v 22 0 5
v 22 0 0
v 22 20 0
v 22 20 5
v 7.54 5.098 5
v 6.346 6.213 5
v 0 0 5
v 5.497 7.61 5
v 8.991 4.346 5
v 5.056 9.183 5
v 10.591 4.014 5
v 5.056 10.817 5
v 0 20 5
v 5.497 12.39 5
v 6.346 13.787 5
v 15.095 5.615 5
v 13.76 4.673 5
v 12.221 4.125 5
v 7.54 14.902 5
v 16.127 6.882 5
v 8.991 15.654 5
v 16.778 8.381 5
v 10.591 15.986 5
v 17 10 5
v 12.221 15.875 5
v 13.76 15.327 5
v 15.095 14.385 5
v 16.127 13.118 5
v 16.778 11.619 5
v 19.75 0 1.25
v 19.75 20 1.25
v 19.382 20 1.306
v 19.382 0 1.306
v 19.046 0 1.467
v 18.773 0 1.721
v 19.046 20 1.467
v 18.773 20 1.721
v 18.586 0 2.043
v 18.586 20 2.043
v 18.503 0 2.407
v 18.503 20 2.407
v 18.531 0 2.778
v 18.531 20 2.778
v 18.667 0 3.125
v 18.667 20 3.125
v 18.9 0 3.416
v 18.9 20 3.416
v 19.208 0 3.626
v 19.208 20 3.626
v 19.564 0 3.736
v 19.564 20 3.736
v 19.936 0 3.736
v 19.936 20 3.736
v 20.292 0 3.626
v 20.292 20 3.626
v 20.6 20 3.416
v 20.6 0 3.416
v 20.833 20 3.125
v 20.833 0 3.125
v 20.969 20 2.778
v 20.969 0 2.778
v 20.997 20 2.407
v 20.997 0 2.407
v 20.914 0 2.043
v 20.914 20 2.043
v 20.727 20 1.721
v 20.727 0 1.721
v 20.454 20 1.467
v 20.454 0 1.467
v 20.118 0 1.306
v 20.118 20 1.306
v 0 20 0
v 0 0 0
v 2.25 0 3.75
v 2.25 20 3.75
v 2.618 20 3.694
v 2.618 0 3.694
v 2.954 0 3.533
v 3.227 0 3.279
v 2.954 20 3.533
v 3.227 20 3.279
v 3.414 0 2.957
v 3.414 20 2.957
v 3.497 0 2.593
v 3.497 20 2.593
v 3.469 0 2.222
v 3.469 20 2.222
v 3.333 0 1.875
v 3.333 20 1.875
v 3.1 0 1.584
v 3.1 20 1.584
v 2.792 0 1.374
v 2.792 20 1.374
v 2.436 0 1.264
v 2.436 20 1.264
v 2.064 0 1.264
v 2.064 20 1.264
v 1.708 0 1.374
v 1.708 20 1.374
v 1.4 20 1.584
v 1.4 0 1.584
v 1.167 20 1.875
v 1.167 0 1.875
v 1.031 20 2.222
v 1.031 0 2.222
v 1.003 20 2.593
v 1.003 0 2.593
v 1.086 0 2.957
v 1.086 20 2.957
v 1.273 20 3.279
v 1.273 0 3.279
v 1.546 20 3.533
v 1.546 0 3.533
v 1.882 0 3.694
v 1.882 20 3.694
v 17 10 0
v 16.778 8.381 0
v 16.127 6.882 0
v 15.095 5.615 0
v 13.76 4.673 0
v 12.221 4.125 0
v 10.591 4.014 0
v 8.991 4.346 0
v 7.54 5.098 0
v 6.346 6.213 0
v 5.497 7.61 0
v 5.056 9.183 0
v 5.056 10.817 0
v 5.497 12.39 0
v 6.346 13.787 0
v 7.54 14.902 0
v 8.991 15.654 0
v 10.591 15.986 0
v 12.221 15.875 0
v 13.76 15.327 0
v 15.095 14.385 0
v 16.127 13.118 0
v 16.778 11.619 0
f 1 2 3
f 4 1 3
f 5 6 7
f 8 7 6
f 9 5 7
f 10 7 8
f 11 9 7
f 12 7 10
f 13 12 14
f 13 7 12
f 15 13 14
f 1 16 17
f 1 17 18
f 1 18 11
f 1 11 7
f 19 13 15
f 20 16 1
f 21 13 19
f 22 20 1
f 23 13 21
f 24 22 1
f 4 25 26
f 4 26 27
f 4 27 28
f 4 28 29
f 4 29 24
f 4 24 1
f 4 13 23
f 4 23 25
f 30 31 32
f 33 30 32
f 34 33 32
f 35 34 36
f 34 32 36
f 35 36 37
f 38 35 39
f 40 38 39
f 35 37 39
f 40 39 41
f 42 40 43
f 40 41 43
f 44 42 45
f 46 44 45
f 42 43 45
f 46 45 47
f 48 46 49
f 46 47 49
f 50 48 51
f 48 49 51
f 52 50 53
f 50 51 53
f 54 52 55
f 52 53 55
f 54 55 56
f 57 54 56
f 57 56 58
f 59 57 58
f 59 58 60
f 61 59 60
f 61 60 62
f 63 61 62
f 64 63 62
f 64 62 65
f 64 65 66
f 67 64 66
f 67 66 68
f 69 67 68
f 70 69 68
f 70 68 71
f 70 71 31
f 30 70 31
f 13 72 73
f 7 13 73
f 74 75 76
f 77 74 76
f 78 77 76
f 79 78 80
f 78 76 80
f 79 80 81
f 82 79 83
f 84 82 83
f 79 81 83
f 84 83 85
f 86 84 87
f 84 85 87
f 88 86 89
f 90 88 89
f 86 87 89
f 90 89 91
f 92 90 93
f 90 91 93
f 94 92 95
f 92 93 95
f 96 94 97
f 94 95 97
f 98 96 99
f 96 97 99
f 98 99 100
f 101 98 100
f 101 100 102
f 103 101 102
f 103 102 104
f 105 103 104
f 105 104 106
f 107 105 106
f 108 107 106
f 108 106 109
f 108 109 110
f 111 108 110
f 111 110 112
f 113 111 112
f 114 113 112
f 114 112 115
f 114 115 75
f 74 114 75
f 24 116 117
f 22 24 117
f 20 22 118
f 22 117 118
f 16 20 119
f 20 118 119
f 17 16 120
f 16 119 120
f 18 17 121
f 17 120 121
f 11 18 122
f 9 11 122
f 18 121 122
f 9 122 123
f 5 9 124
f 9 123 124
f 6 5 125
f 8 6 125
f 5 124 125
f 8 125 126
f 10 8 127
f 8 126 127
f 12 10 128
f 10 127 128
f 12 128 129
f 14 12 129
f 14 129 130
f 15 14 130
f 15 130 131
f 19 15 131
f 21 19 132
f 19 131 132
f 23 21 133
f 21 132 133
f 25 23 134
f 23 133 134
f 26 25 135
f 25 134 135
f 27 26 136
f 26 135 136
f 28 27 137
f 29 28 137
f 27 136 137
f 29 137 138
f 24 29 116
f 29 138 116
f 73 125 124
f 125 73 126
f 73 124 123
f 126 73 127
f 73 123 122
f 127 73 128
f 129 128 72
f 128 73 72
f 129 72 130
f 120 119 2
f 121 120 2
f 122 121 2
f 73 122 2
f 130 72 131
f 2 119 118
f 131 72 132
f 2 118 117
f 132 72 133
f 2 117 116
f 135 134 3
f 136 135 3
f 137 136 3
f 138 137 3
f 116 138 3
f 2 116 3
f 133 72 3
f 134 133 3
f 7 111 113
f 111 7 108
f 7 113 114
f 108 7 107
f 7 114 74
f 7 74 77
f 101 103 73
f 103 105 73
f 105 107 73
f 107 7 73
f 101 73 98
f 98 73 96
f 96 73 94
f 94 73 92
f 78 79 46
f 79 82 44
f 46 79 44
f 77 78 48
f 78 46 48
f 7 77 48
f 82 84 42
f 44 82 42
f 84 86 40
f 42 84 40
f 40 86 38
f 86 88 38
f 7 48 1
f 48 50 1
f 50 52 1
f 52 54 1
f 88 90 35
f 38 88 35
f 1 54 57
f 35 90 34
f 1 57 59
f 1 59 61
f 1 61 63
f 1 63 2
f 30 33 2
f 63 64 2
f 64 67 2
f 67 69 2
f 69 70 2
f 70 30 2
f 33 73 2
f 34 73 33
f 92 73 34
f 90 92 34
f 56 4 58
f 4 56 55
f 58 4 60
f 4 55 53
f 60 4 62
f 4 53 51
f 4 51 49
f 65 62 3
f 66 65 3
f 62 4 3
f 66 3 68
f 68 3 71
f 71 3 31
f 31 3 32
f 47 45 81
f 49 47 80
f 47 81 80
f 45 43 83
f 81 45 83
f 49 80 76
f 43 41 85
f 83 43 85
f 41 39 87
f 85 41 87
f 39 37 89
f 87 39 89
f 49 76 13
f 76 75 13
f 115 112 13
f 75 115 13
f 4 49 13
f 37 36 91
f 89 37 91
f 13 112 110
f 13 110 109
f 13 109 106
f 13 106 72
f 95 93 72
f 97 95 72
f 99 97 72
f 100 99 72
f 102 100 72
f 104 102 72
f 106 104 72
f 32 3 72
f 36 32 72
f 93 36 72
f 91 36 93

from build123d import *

# Parameters (mm, degrees)
BOSS_EXTRUDE1_DEPTH = 5
SKETCH11_R          = 1.25
CUT_EXTRUDE1_DEPTH  = 31.149626863


with BuildPart() as part:
    # Sketch1 → Boss-Extrude1 (new body)
    with BuildSketch(Plane.XY):
        with BuildLine():
            Line((0, 20), (0, 10))
            Line((0, 10), (5, 10))
            ThreePointArc((5, 10), (11, 16), (17, 10))
            Line((17, 10), (22, 10))
            Line((22, 10), (22, 20))
            Line((22, 20), (0, 20))
        make_face()
        with BuildLine():
            Line((0, 10), (0, 0))
            Line((0, 0), (22, 0))
            Line((22, 0), (22, 10))
            Line((22, 10), (17, 10))
            ThreePointArc((17, 10), (11, 4), (5, 10))
            Line((5, 10), (0, 10))
        make_face()
    extrude(amount=BOSS_EXTRUDE1_DEPTH)

    # Sketch11 → Cut-Extrude1 (cut, through all)
    with BuildSketch(Plane(origin=(0, 20, 0), x_dir=(1, 0, 0), z_dir=(0, 1, 0))):
        with Locations(Location((2.25, -2.5, 0), (0, 0, 270))):
            Circle(SKETCH11_R)
        with Locations(Location((19.75, -2.5, 0), (0, 0, 90))):
            Circle(SKETCH11_R)
    extrude(amount=-CUT_EXTRUDE1_DEPTH, mode=Mode.SUBTRACT)


solid = part.part
